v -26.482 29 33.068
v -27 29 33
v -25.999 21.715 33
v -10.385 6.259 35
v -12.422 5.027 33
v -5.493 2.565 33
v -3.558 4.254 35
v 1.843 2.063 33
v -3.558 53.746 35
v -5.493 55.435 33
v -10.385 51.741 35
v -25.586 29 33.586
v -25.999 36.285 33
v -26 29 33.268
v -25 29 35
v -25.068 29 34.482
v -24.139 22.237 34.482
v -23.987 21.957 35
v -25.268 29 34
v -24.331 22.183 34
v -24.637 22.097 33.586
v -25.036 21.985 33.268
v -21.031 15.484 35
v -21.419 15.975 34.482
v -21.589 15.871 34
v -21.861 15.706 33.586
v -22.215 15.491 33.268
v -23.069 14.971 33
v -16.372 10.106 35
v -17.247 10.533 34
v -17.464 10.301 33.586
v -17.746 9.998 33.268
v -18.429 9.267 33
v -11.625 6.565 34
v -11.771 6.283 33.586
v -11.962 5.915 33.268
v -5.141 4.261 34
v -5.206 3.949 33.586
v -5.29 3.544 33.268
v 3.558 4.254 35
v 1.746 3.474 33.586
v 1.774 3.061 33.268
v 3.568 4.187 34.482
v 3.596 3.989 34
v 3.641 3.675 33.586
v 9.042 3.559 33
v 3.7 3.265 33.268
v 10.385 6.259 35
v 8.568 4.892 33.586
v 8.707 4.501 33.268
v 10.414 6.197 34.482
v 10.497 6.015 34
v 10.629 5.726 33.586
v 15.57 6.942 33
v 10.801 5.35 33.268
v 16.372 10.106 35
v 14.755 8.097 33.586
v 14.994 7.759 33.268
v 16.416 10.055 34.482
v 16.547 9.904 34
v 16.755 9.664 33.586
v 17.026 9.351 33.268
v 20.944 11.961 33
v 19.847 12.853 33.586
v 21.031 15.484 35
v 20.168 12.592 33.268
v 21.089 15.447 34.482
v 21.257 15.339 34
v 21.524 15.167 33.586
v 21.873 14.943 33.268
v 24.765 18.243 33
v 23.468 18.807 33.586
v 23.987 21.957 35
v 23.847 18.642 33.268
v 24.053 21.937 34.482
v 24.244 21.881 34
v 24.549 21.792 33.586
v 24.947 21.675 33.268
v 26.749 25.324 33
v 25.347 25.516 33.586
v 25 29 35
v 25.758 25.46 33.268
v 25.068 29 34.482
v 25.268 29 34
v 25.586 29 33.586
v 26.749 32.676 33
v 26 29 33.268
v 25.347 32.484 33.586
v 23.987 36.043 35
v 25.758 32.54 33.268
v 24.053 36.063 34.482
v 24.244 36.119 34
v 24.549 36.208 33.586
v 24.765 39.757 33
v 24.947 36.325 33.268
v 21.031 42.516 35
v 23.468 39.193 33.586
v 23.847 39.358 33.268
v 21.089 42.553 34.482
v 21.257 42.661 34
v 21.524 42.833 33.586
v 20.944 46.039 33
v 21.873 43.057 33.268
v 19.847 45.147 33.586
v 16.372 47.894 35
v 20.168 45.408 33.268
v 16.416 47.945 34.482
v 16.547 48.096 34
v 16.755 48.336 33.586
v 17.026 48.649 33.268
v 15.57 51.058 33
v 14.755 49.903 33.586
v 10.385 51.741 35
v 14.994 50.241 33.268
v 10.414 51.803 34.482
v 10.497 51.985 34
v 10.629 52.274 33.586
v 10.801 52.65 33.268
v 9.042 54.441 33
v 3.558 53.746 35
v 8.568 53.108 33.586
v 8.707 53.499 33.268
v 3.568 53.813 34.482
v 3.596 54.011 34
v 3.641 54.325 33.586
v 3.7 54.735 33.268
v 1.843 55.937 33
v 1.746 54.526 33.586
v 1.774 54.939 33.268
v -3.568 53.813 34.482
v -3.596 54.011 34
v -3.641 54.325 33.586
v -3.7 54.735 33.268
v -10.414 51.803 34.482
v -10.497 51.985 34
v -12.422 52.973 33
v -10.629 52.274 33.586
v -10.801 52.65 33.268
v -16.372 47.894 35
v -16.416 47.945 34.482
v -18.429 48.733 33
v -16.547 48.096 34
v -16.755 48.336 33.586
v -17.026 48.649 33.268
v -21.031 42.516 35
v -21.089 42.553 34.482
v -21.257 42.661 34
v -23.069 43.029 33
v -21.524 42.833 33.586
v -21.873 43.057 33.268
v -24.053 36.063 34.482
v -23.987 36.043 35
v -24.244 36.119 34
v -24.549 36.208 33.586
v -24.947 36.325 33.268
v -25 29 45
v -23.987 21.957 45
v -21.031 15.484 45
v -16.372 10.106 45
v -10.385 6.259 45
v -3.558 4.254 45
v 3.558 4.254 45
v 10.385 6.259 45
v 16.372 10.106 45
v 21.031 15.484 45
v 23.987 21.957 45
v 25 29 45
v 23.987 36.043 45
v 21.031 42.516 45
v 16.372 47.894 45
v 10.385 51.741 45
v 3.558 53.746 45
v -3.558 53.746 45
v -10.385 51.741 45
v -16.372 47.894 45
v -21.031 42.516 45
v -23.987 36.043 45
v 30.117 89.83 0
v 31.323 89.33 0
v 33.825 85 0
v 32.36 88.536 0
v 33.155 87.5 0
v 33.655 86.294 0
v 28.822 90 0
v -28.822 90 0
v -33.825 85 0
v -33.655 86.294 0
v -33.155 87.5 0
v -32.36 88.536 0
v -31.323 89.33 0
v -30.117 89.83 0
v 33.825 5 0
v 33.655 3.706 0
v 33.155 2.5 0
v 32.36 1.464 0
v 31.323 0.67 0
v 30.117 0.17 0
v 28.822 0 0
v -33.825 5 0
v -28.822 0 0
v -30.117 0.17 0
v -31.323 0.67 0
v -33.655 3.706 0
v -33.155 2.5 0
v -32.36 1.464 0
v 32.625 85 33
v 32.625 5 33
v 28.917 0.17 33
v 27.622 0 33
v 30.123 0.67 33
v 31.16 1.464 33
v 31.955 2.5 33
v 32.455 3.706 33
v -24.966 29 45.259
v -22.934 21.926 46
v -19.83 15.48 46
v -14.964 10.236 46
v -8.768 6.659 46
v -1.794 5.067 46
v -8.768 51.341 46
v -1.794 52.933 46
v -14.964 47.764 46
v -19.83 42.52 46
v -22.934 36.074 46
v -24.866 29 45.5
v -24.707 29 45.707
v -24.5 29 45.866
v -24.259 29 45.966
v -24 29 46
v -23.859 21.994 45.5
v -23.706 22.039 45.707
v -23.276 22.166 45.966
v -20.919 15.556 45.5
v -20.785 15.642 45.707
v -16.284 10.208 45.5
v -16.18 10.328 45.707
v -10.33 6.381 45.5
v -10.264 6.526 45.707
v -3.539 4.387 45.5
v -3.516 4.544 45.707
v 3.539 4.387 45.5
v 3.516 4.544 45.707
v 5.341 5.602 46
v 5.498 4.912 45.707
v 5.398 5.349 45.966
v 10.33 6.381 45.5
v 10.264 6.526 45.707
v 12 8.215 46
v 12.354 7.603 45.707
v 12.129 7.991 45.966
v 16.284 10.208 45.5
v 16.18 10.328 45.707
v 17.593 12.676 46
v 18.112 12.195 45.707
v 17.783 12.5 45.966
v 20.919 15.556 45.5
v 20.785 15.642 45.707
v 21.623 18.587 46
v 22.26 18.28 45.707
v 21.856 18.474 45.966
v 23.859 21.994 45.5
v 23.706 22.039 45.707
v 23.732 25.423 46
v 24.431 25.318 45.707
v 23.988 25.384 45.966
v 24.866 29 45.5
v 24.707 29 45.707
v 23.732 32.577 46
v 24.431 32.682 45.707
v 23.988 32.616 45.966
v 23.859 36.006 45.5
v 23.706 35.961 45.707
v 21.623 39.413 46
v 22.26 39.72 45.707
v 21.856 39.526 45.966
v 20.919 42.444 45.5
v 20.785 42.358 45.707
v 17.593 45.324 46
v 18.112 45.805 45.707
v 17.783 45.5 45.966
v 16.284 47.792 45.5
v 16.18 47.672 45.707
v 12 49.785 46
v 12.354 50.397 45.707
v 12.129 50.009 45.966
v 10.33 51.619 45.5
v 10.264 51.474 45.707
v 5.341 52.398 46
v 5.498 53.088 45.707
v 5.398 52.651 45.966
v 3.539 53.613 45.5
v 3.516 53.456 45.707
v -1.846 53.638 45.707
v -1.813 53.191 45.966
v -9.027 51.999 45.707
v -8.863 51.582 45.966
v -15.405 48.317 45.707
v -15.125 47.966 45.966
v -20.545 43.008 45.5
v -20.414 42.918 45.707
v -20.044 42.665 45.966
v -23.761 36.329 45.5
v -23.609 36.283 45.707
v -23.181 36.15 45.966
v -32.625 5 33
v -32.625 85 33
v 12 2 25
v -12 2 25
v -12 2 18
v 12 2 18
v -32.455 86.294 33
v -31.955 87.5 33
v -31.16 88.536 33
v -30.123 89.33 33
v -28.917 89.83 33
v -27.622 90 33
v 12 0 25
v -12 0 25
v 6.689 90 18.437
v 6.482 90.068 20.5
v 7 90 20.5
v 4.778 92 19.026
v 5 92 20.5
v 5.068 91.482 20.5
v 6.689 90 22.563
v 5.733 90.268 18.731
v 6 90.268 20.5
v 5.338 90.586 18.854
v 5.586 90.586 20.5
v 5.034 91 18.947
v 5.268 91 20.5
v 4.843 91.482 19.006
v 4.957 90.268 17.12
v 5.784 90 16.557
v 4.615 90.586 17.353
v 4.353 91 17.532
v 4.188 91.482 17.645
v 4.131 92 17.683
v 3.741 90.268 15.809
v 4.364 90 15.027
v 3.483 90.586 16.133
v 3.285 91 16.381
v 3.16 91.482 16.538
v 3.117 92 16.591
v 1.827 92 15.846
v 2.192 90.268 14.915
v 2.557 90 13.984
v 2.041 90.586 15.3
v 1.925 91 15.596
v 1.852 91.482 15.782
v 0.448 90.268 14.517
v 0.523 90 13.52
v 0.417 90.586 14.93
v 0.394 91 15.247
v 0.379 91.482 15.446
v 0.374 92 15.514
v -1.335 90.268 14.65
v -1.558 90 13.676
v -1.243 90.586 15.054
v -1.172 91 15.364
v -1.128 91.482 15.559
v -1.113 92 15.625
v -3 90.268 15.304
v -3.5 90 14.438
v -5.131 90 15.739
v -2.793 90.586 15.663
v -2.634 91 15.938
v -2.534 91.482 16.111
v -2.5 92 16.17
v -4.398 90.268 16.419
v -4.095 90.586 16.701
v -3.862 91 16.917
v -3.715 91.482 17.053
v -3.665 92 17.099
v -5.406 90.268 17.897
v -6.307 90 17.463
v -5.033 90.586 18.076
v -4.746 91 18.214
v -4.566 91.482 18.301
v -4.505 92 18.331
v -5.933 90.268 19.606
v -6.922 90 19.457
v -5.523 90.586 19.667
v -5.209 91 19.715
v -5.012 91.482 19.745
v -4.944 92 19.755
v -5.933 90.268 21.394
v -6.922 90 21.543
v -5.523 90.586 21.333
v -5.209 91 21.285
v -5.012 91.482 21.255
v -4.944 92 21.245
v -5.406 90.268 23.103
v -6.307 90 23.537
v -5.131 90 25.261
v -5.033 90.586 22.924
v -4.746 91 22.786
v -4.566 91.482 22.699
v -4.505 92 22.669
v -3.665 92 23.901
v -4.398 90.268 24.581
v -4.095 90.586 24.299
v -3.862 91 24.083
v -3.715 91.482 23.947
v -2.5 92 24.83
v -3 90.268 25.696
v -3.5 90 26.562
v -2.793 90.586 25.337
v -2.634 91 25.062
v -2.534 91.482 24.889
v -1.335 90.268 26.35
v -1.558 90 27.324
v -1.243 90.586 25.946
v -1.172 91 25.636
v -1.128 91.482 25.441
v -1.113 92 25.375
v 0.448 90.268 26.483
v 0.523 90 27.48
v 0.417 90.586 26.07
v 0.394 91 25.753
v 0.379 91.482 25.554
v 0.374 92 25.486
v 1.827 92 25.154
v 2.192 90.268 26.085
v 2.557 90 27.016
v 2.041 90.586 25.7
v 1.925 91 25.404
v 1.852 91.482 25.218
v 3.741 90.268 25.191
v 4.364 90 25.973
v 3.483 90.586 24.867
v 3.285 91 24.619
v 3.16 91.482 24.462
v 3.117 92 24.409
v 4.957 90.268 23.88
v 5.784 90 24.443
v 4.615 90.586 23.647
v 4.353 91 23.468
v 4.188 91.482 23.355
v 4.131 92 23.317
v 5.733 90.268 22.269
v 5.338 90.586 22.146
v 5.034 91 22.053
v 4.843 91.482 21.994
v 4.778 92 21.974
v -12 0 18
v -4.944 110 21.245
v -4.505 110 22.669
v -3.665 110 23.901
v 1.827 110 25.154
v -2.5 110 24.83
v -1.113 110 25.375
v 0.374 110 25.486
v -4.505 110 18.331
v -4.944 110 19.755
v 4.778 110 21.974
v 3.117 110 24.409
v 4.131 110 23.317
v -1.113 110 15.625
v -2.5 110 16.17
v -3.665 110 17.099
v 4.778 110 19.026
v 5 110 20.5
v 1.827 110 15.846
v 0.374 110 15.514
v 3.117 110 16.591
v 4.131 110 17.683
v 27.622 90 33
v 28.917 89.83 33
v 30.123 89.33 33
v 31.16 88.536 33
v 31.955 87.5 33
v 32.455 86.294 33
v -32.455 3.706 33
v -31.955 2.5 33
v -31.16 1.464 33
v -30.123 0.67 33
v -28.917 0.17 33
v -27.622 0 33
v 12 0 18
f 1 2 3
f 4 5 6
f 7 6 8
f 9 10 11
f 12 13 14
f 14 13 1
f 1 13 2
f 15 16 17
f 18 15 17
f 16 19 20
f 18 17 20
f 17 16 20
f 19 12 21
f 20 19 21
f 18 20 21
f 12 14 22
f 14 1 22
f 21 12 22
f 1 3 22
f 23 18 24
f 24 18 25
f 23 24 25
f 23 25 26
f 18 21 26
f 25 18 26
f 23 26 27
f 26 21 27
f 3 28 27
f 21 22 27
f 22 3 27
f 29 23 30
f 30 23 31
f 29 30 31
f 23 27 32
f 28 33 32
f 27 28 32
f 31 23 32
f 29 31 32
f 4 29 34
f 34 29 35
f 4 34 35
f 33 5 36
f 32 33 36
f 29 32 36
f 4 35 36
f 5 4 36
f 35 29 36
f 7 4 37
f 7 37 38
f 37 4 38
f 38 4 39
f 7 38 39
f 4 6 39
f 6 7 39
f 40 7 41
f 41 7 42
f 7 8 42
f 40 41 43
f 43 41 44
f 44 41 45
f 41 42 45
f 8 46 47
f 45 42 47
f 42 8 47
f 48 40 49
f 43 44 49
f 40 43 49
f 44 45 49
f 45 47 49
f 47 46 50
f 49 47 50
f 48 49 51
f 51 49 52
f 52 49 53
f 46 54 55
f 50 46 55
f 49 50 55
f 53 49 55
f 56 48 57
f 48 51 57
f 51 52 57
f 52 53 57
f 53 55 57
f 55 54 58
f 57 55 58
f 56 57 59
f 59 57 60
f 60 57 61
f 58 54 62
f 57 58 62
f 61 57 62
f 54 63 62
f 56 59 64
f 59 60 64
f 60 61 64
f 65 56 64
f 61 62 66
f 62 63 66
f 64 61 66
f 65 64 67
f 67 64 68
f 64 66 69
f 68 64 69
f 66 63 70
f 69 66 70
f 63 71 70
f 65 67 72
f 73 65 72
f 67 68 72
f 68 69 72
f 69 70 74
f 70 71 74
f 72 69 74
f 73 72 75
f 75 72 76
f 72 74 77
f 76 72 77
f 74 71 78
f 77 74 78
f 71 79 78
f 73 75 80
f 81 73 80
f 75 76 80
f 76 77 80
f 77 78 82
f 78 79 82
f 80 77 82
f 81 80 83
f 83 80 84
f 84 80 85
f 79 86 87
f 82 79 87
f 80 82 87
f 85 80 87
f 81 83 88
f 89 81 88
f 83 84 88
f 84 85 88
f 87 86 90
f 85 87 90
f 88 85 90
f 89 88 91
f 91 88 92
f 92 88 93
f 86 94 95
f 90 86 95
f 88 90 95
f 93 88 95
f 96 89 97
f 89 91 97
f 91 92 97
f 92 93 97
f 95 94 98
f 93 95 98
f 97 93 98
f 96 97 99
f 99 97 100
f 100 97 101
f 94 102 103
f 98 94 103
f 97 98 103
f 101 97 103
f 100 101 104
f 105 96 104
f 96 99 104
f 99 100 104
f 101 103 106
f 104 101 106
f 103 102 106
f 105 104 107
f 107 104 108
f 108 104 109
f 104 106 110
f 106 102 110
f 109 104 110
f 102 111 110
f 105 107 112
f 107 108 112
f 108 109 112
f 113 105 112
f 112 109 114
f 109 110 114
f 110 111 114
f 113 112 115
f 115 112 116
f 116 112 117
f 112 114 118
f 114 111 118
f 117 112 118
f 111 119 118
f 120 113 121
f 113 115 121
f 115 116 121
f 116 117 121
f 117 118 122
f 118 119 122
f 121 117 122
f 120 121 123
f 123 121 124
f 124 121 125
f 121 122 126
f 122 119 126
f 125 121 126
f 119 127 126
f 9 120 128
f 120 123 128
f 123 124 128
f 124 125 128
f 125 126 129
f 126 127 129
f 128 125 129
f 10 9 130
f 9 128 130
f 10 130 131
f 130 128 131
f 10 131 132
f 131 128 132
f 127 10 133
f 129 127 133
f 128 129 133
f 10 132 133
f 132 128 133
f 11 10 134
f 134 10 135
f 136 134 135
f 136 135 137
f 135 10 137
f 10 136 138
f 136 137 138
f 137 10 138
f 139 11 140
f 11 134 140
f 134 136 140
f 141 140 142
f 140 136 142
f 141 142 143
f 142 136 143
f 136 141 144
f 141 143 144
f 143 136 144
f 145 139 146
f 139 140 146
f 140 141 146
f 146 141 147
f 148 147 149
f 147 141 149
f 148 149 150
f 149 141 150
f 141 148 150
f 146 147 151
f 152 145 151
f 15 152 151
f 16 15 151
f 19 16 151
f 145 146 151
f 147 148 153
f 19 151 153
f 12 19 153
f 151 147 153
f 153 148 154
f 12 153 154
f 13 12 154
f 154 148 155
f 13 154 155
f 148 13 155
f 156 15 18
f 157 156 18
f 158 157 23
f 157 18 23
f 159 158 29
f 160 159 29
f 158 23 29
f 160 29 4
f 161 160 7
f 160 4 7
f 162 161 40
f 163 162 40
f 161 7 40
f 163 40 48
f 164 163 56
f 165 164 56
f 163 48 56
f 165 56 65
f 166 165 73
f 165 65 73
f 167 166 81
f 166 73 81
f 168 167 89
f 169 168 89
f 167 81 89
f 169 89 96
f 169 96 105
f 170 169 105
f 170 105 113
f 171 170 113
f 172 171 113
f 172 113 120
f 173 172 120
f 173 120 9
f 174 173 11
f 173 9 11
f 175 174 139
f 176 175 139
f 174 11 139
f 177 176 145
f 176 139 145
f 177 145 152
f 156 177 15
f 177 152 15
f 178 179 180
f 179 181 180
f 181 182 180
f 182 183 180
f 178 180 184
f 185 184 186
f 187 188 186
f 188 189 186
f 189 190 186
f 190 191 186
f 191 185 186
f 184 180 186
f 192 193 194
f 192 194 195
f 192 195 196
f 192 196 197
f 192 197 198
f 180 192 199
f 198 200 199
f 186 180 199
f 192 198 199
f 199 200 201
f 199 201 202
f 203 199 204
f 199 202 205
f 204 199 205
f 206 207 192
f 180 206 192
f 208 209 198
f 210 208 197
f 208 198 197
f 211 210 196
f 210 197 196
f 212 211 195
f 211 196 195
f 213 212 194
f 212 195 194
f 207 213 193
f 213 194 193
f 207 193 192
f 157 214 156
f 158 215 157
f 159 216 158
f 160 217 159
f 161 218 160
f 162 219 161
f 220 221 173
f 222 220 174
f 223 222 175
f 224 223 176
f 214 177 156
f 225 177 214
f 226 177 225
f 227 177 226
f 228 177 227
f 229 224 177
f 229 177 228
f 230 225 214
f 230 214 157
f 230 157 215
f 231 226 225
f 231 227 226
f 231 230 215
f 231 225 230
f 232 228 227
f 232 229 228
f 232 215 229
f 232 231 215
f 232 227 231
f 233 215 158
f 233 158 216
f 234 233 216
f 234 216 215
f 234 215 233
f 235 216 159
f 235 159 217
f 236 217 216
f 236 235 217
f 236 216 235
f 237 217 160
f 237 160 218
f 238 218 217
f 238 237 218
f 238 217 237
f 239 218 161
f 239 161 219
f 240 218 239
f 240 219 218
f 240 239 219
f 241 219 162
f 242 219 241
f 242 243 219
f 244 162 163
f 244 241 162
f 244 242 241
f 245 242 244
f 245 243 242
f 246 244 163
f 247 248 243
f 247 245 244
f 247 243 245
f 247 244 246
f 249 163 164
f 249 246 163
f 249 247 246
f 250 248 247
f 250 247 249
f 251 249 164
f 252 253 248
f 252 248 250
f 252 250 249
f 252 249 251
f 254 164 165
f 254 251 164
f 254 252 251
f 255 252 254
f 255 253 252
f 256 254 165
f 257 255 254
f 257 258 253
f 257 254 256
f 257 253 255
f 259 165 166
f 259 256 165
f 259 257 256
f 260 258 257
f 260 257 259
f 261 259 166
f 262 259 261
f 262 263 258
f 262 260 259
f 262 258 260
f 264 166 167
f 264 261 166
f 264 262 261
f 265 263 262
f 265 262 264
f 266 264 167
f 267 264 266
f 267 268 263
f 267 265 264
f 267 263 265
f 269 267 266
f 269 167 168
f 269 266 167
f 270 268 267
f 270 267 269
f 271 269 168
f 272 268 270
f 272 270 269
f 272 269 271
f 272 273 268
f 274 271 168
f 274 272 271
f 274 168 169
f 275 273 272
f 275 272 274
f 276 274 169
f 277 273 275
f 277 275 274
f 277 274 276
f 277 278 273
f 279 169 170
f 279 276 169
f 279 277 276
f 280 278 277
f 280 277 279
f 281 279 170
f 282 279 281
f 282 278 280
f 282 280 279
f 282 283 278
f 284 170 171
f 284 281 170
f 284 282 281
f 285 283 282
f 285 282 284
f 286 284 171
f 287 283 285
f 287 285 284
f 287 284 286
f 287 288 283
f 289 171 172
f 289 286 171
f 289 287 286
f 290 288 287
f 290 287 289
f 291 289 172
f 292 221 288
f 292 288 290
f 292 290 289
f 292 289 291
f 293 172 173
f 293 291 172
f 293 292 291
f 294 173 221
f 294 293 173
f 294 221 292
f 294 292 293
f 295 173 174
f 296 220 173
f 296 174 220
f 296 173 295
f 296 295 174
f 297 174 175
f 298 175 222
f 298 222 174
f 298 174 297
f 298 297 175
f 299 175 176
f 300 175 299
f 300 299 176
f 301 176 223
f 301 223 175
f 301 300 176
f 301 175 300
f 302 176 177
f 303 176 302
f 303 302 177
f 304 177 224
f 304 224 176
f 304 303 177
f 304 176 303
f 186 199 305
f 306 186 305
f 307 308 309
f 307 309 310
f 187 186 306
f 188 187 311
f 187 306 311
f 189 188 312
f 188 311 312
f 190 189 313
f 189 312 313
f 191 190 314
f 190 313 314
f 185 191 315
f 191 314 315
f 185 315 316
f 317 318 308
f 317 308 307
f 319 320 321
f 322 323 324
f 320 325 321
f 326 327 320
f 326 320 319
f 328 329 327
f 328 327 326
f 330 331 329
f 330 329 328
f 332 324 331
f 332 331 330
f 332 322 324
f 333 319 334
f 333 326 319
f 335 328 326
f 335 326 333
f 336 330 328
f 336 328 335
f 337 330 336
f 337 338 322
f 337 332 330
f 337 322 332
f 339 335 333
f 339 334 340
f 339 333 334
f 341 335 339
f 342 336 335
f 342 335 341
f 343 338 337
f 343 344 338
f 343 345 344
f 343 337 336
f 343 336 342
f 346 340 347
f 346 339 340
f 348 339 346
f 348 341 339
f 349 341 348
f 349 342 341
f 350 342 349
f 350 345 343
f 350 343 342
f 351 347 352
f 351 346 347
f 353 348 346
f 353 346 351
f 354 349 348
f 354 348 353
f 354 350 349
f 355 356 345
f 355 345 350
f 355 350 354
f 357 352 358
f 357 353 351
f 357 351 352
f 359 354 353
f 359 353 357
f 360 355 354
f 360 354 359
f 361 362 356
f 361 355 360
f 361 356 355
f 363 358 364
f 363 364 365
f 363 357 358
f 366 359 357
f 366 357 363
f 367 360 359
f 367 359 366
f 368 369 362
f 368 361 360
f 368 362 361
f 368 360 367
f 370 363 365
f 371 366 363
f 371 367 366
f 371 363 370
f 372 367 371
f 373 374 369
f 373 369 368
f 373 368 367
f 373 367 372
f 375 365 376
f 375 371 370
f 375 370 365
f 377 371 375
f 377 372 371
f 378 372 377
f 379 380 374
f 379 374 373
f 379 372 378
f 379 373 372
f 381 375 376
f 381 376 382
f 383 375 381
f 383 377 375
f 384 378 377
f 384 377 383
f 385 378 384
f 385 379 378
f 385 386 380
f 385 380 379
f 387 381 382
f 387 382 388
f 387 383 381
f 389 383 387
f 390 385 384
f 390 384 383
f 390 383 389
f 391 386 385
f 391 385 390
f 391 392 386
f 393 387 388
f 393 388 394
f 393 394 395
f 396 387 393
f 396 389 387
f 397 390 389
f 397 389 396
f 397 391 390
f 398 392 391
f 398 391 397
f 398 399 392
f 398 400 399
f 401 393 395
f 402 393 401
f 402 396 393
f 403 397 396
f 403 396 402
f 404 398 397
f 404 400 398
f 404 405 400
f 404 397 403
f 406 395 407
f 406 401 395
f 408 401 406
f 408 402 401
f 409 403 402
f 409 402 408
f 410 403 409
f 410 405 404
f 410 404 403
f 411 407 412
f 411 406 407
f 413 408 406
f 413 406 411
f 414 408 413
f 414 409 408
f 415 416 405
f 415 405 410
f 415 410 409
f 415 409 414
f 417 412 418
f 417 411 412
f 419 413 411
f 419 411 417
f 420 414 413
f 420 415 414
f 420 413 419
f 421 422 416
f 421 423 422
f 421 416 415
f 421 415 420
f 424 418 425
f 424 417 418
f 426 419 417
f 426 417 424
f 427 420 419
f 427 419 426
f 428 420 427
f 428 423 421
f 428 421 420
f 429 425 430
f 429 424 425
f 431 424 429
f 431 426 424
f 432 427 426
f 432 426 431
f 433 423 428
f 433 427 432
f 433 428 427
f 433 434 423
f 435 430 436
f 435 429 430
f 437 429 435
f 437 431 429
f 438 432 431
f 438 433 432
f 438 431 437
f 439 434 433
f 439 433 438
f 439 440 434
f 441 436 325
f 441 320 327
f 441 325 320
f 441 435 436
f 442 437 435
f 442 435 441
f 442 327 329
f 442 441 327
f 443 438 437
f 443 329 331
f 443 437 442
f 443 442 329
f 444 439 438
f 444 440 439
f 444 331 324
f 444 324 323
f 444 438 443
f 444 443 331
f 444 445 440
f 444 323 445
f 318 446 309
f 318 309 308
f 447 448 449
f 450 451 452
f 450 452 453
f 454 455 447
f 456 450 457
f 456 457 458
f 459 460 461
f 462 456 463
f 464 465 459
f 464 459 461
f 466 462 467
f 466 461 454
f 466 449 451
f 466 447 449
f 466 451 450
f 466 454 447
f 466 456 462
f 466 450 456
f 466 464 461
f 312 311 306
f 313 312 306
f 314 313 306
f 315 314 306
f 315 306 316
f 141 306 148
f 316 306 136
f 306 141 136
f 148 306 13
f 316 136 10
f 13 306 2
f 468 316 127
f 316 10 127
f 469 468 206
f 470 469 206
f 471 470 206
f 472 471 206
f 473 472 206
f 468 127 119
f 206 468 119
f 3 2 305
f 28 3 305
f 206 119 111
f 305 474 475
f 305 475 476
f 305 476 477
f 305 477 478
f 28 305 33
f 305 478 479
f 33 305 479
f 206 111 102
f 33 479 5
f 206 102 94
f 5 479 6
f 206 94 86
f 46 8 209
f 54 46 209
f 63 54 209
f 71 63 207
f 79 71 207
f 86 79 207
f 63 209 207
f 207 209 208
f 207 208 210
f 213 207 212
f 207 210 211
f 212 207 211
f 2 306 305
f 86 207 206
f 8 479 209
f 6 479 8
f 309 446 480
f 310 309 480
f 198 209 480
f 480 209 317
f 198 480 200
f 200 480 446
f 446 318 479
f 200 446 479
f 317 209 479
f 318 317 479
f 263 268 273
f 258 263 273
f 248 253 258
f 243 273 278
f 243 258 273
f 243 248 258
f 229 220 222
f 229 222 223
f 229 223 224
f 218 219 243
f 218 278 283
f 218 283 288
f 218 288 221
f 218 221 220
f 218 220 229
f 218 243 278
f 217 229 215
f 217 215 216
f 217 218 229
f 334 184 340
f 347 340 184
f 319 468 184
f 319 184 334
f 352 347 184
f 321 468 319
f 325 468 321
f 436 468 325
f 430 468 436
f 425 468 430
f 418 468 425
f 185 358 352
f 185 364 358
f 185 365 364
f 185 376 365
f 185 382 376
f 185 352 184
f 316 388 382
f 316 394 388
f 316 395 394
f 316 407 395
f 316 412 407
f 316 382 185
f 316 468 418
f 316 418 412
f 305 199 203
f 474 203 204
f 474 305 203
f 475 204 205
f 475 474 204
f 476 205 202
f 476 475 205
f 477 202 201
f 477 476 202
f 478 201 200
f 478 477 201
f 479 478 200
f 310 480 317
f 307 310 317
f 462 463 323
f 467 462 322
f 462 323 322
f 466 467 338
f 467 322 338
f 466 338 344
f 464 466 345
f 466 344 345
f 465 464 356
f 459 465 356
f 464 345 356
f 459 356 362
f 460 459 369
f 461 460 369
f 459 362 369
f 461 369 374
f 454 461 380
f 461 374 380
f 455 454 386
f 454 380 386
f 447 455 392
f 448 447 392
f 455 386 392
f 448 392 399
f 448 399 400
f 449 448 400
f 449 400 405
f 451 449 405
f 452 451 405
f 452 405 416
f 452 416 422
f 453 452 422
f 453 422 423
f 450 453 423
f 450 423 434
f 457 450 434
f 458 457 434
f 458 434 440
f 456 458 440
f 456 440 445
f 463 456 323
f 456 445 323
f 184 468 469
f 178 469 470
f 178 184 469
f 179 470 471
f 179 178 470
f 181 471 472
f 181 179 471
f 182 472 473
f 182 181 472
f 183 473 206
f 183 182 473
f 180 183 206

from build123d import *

# Parameters (mm, degrees)
PAD_DEPTH    = 90
SKETCH001_W  = 24
SKETCH001_H  = 7
POCKET_DEPTH = 2
SKETCH002_R  = 25
PAD001_DEPTH = 13
FILLET_R     = 1
FILLET001_R  = 2
FILLET002_R  = 5
SKETCH003_R  = 5
PAD002_DEPTH = 20
FILLET003_R  = 2


with BuildPart() as part:
    # Sketch → Pad (new body)
    with BuildSketch(Plane.XZ):
        Polygon((-32.625, 33), (32.625, 33), (33.825, 0), (-33.825, 0), align=None)
    extrude(amount=-PAD_DEPTH)

    # Sketch001 (on Face5 of Pad) → Pocket (cut)
    with BuildSketch(Plane.XZ):
        with Locations((0, 21.5)):
            Rectangle(SKETCH001_W, SKETCH001_H)
    extrude(amount=-POCKET_DEPTH, mode=Mode.SUBTRACT)

    # Sketch002 (on Face1 of Pocket) → Pad001 (join)
    with BuildSketch(Plane(origin=(0, 0, 33), x_dir=(-1, 0, 0), z_dir=(0, 0, 1))):
        with Locations((0, -29)):
            Circle(SKETCH002_R)
    extrude(amount=PAD001_DEPTH)

    # Fillet
    fillet_edges = [part.edges().sort_by_distance(p)[0] for p in [
        (25, 29, 46),
    ]]
    fillet(fillet_edges, radius=FILLET_R)

    # Fillet001
    fillet001_edges = [part.edges().sort_by_distance(p)[0] for p in [
        (25, 29, 33),
    ]]
    fillet(fillet001_edges, radius=FILLET001_R)

    # Fillet002
    fillet002_edges = [part.edges().sort_by_distance(p)[0] for p in [
        (33.225, 0, 16.5),
        (33.225, 90, 16.5),
        (-33.225, 0, 16.5),
        (-33.225, 90, 16.5),
    ]]
    fillet(fillet002_edges, radius=FILLET002_R)

    # Sketch003 (on Face6 of Fillet002) → Pad002 (join)
    with BuildSketch(Plane(origin=(0, 90, 0), x_dir=(1, 0, 0), z_dir=(0, 1, 0))):
        with Locations((0, -20.5)):
            Circle(SKETCH003_R)
    extrude(amount=PAD002_DEPTH)

    # Fillet003
    fillet003_edges = [part.edges().sort_by_distance(p)[0] for p in [
        (-5, 90, 20.5),
    ]]
    fillet(fillet003_edges, radius=FILLET003_R)


solid = part.part
